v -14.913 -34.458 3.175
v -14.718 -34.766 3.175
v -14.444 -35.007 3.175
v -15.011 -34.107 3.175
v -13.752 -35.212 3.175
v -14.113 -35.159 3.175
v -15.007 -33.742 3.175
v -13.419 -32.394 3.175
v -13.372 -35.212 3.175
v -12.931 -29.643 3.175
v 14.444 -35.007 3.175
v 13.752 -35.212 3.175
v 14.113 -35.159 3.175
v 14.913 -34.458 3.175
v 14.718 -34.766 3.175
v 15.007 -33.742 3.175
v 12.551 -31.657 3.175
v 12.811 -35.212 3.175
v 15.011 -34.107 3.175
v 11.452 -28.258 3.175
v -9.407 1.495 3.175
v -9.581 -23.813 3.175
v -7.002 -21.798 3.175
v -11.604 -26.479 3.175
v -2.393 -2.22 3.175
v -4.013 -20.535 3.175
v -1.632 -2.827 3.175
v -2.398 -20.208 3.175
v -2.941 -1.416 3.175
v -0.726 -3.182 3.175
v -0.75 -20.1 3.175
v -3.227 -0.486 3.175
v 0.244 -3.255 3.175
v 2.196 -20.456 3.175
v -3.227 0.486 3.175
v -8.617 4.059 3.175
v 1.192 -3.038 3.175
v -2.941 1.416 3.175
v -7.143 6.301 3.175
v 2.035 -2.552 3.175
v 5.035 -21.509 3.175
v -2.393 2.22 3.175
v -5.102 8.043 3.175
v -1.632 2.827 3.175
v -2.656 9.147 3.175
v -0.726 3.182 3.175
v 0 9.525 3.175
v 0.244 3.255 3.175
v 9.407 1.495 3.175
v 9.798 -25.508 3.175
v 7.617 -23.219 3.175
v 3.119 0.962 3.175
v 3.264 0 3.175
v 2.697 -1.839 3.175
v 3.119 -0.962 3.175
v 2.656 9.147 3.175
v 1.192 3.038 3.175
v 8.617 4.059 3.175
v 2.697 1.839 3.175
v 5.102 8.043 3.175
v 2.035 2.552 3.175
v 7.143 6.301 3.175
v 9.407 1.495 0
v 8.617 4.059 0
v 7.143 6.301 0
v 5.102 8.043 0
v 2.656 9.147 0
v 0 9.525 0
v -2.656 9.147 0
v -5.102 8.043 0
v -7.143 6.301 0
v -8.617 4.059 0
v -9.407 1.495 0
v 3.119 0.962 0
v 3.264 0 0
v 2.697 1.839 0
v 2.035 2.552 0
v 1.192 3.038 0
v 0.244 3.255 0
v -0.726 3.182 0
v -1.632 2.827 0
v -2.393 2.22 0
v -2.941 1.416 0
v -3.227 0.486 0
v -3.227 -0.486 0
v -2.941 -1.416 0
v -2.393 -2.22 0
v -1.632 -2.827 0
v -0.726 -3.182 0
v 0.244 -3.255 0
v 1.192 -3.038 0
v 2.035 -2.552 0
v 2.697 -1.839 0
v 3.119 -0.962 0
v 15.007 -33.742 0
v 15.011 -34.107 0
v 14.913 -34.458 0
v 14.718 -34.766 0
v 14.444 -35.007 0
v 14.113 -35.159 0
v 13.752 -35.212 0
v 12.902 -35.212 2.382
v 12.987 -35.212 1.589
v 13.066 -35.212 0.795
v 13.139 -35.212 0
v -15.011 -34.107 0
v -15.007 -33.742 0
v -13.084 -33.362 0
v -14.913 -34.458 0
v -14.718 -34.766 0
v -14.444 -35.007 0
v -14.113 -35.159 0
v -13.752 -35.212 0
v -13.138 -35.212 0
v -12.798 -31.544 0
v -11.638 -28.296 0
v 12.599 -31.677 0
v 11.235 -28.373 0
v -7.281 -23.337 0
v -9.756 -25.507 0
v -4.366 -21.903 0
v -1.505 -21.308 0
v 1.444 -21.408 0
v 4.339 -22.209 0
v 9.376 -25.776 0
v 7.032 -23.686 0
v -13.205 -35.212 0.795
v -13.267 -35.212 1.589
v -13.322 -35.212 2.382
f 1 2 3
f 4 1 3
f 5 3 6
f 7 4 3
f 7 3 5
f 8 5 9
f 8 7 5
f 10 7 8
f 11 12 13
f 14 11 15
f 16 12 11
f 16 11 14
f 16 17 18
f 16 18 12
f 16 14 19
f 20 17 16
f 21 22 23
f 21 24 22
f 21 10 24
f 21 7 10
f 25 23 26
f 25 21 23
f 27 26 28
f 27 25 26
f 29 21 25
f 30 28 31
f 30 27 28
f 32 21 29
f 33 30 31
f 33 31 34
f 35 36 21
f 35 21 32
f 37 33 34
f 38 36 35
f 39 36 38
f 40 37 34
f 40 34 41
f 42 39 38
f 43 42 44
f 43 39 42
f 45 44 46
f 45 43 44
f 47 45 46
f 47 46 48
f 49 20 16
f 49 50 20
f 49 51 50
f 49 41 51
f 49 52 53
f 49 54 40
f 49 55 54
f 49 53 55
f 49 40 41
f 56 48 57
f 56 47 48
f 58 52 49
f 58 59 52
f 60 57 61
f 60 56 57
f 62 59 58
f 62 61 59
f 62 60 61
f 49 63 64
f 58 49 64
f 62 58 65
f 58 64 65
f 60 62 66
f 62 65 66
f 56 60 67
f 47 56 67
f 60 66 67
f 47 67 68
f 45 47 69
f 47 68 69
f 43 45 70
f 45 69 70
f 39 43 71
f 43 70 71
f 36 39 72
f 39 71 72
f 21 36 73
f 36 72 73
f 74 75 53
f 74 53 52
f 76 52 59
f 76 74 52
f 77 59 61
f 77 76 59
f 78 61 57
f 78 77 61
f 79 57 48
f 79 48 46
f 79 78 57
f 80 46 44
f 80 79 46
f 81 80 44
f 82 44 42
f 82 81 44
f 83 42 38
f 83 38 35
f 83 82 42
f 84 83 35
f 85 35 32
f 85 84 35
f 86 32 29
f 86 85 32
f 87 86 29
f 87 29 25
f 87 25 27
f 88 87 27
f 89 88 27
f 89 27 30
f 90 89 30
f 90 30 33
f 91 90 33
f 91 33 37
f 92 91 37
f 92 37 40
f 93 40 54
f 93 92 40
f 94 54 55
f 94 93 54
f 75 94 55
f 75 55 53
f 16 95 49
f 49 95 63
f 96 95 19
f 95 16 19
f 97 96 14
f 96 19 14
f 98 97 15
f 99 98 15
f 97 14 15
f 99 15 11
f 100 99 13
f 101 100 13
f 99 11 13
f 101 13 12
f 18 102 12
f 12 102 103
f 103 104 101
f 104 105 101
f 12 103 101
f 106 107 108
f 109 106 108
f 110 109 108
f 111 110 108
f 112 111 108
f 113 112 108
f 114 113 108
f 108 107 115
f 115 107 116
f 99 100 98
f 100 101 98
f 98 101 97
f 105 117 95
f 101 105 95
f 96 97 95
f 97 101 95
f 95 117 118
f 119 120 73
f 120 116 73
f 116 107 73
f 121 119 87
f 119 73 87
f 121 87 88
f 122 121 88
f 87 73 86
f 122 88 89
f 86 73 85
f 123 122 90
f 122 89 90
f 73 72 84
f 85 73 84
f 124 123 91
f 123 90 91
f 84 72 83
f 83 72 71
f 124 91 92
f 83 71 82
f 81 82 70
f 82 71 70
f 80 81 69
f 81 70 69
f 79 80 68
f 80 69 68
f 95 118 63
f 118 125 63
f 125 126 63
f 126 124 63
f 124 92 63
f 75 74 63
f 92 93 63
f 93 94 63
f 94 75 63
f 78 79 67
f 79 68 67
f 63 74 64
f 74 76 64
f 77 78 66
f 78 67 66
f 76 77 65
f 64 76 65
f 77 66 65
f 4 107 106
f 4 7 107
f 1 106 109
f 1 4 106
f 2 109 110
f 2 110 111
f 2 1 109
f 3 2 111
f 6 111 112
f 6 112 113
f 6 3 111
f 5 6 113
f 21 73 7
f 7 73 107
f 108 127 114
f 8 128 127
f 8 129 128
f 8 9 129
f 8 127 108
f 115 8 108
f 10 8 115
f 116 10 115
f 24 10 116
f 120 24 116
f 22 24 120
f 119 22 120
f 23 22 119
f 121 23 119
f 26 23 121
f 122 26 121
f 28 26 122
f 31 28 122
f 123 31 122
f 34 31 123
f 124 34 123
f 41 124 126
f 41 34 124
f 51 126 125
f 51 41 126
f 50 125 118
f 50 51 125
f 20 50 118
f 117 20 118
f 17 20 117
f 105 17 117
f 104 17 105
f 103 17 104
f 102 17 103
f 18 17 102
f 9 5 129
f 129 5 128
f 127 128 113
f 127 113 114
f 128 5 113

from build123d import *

# Parameters (mm, degrees)
SKETCH1_R           = 3.2639
BOSS_EXTRUDE1_DEPTH = 3.175
CAVITY1_START       = 3.689049998
CAVITY1_DEPTH       = 9.603434939
FILLET3_R           = 1.27


# Read off the part's stored shape, not the designer's step: Cavity1
with BuildPart() as part:
    # Sketch1 → Boss-Extrude1 (new body)
    with BuildSketch(Plane.XY):
        with BuildLine():
            ThreePointArc((9.406966983, 1.494856913), (0, 9.525), (-9.406966983, 1.494856913))
            Line((-9.406966983, 1.494856913), (-15.24, -35.211766))
            Line((-15.24, -35.211766), (15.24, -35.211766))
            Line((15.24, -35.211766), (9.406966983, 1.494856913))
        make_face()
        Circle(SKETCH1_R, mode=Mode.SUBTRACT)
    extrude(amount=BOSS_EXTRUDE1_DEPTH)

    # Cavity1 outline → Cavity1 (cut)
    with BuildSketch(Plane(origin=(0, 0, 0), x_dir=(0.9955947349362284, 0.032256539947670526, 0.08803771576924041), z_dir=(0.09376099278090663, -0.3425138790307331, -0.9348225066311033)).offset(CAVITY1_START)):
        with BuildLine():
            Line((-14.012226084, 36), (-14.169183947, 34.154693399))
            ThreePointArc((-14.169183947, 34.154693399), (-1.135248211, 19.965054491), (11.898687525, 34.154693399))
            Line((11.898687525, 34.154693399), (11.741729662, 36))
            Line((11.741729662, 36), (-14.012226084, 36))
        make_face()
    extrude(amount=CAVITY1_DEPTH, mode=Mode.SUBTRACT)

    # Fillet3
    fillet3_edges = [part.edges().sort_by_distance(p)[0] for p in [
        (-15.24, -35.211766, 1.5875),
        (15.24, -35.211766, 1.5875),
    ]]
    fillet(fillet3_edges, radius=FILLET3_R)


solid = part.part
